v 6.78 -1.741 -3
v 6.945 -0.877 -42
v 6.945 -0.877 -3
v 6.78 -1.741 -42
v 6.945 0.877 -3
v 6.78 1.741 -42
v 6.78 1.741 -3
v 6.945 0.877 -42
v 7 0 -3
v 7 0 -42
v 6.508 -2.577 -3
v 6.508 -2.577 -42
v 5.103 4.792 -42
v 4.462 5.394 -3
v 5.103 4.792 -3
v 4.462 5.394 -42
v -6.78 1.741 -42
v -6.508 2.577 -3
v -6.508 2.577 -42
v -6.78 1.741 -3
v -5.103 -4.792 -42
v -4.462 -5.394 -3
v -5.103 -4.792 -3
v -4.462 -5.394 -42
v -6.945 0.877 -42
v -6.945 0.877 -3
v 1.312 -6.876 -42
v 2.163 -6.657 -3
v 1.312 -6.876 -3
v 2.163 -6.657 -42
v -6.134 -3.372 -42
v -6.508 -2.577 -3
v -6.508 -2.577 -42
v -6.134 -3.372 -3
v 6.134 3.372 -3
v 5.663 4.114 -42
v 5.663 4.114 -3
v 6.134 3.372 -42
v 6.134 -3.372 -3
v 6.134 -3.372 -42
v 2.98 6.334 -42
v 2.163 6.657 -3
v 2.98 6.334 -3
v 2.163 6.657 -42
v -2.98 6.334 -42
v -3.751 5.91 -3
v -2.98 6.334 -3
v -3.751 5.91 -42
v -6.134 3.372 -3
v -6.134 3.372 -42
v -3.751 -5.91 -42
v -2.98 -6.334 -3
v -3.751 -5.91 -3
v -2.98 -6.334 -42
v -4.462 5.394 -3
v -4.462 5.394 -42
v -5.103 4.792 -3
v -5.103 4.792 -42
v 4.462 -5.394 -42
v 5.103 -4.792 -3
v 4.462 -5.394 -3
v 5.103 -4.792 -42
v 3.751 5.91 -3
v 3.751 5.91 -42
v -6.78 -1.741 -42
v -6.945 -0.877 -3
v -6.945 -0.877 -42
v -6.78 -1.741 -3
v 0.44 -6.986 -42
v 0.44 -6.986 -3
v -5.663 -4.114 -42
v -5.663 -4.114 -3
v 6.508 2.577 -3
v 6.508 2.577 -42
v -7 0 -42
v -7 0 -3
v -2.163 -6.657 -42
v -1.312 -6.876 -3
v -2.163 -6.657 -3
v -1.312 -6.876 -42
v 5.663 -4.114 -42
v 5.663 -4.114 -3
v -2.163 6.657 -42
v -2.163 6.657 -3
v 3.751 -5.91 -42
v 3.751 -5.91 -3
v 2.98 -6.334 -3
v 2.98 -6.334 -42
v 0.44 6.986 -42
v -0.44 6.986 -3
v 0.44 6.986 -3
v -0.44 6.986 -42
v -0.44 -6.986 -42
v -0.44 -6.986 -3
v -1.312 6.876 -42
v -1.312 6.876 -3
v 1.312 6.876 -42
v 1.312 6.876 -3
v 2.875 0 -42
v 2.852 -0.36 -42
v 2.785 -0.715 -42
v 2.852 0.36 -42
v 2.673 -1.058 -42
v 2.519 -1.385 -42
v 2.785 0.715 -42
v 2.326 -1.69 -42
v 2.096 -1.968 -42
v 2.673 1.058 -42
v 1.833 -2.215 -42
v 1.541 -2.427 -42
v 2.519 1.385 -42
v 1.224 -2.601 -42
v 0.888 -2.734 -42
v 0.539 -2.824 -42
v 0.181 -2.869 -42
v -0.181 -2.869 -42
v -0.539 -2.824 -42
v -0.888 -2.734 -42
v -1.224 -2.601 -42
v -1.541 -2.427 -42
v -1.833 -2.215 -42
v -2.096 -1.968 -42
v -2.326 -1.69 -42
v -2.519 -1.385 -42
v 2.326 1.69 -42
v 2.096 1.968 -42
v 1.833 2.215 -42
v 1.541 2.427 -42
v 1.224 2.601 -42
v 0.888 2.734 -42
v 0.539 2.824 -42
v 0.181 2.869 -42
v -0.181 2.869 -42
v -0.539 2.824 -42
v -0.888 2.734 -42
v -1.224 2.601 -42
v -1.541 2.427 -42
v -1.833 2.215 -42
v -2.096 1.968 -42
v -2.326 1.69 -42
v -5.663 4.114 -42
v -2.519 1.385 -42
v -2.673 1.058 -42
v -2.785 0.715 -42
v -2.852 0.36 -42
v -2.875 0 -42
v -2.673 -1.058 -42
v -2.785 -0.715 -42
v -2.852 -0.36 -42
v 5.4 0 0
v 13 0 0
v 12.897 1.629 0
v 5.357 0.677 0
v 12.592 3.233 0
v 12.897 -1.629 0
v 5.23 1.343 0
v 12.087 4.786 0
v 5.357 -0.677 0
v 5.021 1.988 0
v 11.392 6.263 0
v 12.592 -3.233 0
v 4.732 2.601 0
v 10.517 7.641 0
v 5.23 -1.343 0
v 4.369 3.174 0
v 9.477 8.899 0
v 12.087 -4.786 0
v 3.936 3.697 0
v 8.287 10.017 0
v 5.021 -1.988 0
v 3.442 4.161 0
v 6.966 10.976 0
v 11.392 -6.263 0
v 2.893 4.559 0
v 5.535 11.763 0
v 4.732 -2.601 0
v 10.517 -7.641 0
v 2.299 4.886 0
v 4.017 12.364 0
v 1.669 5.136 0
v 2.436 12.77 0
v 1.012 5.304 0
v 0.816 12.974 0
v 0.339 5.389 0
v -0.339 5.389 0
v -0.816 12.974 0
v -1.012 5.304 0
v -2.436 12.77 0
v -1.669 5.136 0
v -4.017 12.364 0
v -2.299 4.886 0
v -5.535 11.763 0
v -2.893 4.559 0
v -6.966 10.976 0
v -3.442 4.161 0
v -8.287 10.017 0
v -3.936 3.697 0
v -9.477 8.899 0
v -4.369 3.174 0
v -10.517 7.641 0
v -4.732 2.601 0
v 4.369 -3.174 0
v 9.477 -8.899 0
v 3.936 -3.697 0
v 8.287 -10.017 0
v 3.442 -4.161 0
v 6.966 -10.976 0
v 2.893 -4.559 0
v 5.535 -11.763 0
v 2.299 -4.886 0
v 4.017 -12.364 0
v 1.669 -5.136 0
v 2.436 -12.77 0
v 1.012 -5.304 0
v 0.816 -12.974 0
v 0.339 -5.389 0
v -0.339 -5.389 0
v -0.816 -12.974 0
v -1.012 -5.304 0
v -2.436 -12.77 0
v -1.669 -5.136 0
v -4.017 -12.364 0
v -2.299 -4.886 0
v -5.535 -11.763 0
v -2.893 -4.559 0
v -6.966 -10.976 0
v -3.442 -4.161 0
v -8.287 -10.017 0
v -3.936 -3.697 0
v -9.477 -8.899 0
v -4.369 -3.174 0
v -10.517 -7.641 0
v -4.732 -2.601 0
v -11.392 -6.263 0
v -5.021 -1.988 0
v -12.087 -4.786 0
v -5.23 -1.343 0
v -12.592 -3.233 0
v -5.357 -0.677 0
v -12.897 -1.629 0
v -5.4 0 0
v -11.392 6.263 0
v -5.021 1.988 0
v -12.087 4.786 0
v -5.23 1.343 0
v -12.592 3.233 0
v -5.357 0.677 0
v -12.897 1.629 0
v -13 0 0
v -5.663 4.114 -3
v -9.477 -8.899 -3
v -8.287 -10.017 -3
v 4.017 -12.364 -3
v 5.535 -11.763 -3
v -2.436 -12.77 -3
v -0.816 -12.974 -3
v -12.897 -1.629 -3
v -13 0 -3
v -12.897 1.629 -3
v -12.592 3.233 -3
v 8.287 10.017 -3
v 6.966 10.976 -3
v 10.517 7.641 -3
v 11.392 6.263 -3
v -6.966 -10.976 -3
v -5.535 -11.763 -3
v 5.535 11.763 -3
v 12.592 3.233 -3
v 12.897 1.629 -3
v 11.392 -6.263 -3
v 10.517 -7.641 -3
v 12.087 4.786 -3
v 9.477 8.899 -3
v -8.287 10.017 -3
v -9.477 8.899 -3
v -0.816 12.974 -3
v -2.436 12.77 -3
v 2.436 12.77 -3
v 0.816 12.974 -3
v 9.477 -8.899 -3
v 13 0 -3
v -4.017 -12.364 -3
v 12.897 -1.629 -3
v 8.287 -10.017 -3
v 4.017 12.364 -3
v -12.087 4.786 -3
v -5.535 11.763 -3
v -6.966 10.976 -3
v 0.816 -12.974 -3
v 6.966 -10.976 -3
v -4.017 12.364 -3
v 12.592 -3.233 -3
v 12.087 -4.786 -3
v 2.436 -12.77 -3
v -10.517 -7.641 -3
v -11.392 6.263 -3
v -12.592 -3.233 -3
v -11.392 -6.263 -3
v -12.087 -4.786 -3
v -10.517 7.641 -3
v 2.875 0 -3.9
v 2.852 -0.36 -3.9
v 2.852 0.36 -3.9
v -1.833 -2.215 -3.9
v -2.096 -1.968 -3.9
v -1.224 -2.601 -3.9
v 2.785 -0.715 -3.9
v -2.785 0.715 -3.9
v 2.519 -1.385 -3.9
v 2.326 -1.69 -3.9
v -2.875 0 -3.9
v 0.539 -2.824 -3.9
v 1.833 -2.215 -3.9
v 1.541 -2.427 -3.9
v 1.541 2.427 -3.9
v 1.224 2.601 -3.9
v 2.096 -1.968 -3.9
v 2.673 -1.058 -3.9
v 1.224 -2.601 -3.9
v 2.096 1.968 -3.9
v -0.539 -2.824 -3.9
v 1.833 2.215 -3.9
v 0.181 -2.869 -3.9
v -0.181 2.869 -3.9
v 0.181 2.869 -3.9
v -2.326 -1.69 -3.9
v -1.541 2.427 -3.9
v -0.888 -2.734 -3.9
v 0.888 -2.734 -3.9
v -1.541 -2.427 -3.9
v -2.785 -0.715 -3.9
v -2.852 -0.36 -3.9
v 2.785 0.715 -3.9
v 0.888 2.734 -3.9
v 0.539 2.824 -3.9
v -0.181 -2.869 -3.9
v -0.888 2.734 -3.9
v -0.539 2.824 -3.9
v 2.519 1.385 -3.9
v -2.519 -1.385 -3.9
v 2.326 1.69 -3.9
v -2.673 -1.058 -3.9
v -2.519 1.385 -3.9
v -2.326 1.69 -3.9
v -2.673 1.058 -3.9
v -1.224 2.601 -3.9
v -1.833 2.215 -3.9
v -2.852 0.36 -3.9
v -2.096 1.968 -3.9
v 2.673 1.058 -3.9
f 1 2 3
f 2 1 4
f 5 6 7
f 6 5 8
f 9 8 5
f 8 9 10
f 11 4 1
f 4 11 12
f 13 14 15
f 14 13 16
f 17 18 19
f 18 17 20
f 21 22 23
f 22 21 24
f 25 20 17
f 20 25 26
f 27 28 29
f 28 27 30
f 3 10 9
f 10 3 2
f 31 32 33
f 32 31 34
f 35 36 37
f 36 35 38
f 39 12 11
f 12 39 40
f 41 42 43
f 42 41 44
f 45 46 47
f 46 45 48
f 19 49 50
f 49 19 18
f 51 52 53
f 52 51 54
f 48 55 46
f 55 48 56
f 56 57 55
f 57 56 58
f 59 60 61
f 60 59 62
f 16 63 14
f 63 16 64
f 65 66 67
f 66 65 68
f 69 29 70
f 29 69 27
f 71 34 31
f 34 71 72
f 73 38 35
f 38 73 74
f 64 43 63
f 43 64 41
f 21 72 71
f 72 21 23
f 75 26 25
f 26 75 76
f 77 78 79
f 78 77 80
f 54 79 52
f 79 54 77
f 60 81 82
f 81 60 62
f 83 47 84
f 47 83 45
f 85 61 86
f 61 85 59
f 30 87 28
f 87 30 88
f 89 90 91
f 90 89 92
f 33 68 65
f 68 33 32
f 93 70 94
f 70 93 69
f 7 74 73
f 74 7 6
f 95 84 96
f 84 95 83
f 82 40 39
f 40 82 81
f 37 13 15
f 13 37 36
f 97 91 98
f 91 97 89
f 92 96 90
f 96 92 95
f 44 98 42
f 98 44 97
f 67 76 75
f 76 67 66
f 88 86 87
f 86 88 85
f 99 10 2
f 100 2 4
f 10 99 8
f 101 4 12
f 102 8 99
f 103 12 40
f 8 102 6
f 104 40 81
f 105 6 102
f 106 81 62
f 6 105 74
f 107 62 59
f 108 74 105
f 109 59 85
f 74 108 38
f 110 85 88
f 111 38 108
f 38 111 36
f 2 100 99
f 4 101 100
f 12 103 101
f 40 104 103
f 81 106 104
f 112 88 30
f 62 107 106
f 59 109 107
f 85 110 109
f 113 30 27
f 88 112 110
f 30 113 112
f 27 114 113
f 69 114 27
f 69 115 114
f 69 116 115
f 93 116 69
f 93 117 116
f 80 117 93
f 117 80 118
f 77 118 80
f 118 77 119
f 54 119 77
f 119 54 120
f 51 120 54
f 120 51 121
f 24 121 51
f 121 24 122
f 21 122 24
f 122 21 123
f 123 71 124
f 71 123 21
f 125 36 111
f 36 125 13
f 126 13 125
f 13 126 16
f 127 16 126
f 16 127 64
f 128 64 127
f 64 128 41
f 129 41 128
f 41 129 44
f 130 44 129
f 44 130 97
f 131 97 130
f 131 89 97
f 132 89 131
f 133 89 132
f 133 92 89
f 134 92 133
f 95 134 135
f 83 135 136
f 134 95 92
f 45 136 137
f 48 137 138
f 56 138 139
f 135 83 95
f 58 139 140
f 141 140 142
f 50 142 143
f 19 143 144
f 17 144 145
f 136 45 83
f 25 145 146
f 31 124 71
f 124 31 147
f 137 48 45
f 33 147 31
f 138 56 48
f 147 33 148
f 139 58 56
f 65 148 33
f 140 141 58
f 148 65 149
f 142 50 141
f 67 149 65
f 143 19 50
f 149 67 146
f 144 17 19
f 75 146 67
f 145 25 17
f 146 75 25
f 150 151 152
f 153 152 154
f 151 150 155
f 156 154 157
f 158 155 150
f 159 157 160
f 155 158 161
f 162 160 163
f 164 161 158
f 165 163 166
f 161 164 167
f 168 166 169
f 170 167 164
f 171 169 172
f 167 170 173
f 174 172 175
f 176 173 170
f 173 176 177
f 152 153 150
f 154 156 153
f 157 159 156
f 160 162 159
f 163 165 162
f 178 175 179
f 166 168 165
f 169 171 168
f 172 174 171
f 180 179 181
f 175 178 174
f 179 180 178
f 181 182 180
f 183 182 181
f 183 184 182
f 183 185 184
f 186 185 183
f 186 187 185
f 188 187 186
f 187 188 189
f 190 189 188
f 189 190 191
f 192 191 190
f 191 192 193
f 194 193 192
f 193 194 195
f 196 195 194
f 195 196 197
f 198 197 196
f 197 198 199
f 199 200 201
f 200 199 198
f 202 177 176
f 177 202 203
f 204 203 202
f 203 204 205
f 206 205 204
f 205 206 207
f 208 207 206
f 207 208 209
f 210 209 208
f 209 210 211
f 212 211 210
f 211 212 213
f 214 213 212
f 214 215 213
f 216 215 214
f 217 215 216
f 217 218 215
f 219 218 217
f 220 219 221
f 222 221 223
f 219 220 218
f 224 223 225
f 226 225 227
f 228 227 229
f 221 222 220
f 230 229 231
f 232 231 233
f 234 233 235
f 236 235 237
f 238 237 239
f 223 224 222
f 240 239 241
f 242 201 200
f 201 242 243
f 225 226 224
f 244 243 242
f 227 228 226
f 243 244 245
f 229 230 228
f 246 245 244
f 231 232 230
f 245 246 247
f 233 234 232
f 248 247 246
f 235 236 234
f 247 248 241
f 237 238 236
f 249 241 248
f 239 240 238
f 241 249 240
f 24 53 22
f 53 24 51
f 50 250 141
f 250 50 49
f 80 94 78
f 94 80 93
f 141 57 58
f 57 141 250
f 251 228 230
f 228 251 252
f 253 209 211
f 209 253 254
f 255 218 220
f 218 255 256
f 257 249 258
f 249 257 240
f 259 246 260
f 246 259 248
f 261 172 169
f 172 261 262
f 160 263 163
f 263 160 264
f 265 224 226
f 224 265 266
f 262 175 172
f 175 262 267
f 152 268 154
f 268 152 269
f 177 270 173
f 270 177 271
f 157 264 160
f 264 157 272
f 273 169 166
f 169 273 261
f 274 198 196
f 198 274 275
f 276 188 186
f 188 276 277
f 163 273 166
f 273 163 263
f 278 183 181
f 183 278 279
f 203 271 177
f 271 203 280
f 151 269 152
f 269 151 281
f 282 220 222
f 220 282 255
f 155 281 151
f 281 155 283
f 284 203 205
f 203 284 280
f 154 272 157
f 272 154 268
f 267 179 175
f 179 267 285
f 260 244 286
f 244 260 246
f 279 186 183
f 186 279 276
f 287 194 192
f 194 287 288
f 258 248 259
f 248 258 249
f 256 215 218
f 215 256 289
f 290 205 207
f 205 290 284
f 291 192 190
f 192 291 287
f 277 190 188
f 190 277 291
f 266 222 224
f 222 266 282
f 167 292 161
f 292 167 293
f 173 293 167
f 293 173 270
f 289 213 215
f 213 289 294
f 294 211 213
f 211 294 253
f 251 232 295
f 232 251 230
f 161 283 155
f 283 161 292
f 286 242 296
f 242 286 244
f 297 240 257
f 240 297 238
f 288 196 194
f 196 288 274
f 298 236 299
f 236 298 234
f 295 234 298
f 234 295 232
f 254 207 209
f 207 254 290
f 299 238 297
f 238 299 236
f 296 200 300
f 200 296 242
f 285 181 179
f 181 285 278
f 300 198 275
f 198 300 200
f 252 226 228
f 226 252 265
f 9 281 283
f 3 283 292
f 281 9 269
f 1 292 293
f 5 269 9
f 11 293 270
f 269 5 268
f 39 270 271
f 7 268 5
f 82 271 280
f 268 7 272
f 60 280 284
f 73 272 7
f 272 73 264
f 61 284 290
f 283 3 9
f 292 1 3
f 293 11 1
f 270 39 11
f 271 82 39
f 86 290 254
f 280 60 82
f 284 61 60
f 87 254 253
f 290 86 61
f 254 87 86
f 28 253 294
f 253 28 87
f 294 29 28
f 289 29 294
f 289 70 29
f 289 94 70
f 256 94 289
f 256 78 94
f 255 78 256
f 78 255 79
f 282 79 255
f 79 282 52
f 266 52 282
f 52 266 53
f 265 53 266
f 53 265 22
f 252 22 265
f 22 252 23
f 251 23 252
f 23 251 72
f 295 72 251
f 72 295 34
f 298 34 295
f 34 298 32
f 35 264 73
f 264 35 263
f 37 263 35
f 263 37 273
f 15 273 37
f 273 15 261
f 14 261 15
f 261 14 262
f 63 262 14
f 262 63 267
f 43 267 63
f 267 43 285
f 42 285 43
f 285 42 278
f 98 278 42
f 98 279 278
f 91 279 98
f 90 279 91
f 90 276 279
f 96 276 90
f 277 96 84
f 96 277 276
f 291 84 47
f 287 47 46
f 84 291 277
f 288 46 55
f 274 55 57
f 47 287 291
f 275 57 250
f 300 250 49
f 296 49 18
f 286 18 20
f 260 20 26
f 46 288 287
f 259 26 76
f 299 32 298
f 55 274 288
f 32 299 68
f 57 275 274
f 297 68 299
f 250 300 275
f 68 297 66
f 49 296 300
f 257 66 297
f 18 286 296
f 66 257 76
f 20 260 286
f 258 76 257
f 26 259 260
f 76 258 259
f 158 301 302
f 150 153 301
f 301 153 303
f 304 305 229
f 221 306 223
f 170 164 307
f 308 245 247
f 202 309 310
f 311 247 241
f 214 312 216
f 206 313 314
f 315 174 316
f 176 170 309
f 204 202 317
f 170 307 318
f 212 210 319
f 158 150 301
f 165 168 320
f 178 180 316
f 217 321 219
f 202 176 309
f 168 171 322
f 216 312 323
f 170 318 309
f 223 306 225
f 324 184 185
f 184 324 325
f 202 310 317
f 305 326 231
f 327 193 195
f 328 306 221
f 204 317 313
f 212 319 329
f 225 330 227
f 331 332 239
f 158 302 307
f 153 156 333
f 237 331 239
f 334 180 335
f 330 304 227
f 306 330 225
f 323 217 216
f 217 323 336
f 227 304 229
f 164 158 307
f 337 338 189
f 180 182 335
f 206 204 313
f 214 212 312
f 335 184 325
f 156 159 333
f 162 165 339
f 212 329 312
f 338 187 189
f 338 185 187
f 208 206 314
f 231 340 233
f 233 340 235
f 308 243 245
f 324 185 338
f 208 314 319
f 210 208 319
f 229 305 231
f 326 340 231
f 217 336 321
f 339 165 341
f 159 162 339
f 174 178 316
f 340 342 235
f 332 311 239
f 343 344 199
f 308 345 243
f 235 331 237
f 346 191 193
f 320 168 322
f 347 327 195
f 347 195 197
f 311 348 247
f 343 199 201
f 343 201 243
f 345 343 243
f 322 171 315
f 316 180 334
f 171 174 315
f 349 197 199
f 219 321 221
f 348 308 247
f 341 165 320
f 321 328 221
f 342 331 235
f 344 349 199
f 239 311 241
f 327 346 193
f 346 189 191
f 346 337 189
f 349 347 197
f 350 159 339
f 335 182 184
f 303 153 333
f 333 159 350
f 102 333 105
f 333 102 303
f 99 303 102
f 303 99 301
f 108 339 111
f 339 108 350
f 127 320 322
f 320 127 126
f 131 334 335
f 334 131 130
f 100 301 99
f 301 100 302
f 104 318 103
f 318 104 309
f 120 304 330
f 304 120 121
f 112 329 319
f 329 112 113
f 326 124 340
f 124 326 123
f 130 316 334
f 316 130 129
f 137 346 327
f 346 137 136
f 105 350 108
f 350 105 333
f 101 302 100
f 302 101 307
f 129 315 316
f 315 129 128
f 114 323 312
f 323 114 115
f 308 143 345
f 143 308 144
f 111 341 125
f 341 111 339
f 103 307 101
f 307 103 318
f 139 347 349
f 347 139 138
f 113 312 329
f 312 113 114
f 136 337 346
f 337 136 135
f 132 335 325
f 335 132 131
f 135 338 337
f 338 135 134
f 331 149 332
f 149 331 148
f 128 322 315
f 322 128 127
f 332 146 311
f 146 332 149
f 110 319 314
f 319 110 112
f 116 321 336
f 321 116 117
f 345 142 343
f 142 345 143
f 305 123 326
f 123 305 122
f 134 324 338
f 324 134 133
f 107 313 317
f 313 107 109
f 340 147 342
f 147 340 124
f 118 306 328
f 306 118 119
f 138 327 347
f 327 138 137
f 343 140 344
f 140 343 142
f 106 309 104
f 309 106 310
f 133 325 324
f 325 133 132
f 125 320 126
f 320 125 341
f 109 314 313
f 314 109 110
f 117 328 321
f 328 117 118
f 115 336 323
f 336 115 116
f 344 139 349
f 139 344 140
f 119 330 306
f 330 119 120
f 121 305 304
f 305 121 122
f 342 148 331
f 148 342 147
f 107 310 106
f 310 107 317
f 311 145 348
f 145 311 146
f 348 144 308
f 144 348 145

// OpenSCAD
$fn = 50;


difference() {
	union() {
		translate(v = [0, 0, -42.0000000000]) {
			cylinder(h = 42, r = 7.0000000000);
		}
		translate(v = [0, 0, -3.0000000000]) {
			cylinder(h = 3, r = 13.0000000000);
		}
	}
	union() {
		translate(v = [0, 0, 0]) {
			rotate(a = [0, 0, 0]) {
				difference() {
					union() {
						#translate(v = [0, 0, -42.0000000000]) {
							cylinder(h = 42, r = 2.6000000000);
						}
						#translate(v = [0, 0, -3.9000000000]) {
							cylinder(h = 3.9000000000, r = 7.0000000000, r1 = 2.8750000000, r2 = 5.4000000000);
						}
						#translate(v = [0, 0, -42.0000000000]) {
							cylinder(h = 42, r = 2.8750000000);
						}
						#translate(v = [0, 0, -42.0000000000]) {
							cylinder(h = 42, r = 2.6000000000);
						}
					}
					union();
				}
			}
		}
	}
}
